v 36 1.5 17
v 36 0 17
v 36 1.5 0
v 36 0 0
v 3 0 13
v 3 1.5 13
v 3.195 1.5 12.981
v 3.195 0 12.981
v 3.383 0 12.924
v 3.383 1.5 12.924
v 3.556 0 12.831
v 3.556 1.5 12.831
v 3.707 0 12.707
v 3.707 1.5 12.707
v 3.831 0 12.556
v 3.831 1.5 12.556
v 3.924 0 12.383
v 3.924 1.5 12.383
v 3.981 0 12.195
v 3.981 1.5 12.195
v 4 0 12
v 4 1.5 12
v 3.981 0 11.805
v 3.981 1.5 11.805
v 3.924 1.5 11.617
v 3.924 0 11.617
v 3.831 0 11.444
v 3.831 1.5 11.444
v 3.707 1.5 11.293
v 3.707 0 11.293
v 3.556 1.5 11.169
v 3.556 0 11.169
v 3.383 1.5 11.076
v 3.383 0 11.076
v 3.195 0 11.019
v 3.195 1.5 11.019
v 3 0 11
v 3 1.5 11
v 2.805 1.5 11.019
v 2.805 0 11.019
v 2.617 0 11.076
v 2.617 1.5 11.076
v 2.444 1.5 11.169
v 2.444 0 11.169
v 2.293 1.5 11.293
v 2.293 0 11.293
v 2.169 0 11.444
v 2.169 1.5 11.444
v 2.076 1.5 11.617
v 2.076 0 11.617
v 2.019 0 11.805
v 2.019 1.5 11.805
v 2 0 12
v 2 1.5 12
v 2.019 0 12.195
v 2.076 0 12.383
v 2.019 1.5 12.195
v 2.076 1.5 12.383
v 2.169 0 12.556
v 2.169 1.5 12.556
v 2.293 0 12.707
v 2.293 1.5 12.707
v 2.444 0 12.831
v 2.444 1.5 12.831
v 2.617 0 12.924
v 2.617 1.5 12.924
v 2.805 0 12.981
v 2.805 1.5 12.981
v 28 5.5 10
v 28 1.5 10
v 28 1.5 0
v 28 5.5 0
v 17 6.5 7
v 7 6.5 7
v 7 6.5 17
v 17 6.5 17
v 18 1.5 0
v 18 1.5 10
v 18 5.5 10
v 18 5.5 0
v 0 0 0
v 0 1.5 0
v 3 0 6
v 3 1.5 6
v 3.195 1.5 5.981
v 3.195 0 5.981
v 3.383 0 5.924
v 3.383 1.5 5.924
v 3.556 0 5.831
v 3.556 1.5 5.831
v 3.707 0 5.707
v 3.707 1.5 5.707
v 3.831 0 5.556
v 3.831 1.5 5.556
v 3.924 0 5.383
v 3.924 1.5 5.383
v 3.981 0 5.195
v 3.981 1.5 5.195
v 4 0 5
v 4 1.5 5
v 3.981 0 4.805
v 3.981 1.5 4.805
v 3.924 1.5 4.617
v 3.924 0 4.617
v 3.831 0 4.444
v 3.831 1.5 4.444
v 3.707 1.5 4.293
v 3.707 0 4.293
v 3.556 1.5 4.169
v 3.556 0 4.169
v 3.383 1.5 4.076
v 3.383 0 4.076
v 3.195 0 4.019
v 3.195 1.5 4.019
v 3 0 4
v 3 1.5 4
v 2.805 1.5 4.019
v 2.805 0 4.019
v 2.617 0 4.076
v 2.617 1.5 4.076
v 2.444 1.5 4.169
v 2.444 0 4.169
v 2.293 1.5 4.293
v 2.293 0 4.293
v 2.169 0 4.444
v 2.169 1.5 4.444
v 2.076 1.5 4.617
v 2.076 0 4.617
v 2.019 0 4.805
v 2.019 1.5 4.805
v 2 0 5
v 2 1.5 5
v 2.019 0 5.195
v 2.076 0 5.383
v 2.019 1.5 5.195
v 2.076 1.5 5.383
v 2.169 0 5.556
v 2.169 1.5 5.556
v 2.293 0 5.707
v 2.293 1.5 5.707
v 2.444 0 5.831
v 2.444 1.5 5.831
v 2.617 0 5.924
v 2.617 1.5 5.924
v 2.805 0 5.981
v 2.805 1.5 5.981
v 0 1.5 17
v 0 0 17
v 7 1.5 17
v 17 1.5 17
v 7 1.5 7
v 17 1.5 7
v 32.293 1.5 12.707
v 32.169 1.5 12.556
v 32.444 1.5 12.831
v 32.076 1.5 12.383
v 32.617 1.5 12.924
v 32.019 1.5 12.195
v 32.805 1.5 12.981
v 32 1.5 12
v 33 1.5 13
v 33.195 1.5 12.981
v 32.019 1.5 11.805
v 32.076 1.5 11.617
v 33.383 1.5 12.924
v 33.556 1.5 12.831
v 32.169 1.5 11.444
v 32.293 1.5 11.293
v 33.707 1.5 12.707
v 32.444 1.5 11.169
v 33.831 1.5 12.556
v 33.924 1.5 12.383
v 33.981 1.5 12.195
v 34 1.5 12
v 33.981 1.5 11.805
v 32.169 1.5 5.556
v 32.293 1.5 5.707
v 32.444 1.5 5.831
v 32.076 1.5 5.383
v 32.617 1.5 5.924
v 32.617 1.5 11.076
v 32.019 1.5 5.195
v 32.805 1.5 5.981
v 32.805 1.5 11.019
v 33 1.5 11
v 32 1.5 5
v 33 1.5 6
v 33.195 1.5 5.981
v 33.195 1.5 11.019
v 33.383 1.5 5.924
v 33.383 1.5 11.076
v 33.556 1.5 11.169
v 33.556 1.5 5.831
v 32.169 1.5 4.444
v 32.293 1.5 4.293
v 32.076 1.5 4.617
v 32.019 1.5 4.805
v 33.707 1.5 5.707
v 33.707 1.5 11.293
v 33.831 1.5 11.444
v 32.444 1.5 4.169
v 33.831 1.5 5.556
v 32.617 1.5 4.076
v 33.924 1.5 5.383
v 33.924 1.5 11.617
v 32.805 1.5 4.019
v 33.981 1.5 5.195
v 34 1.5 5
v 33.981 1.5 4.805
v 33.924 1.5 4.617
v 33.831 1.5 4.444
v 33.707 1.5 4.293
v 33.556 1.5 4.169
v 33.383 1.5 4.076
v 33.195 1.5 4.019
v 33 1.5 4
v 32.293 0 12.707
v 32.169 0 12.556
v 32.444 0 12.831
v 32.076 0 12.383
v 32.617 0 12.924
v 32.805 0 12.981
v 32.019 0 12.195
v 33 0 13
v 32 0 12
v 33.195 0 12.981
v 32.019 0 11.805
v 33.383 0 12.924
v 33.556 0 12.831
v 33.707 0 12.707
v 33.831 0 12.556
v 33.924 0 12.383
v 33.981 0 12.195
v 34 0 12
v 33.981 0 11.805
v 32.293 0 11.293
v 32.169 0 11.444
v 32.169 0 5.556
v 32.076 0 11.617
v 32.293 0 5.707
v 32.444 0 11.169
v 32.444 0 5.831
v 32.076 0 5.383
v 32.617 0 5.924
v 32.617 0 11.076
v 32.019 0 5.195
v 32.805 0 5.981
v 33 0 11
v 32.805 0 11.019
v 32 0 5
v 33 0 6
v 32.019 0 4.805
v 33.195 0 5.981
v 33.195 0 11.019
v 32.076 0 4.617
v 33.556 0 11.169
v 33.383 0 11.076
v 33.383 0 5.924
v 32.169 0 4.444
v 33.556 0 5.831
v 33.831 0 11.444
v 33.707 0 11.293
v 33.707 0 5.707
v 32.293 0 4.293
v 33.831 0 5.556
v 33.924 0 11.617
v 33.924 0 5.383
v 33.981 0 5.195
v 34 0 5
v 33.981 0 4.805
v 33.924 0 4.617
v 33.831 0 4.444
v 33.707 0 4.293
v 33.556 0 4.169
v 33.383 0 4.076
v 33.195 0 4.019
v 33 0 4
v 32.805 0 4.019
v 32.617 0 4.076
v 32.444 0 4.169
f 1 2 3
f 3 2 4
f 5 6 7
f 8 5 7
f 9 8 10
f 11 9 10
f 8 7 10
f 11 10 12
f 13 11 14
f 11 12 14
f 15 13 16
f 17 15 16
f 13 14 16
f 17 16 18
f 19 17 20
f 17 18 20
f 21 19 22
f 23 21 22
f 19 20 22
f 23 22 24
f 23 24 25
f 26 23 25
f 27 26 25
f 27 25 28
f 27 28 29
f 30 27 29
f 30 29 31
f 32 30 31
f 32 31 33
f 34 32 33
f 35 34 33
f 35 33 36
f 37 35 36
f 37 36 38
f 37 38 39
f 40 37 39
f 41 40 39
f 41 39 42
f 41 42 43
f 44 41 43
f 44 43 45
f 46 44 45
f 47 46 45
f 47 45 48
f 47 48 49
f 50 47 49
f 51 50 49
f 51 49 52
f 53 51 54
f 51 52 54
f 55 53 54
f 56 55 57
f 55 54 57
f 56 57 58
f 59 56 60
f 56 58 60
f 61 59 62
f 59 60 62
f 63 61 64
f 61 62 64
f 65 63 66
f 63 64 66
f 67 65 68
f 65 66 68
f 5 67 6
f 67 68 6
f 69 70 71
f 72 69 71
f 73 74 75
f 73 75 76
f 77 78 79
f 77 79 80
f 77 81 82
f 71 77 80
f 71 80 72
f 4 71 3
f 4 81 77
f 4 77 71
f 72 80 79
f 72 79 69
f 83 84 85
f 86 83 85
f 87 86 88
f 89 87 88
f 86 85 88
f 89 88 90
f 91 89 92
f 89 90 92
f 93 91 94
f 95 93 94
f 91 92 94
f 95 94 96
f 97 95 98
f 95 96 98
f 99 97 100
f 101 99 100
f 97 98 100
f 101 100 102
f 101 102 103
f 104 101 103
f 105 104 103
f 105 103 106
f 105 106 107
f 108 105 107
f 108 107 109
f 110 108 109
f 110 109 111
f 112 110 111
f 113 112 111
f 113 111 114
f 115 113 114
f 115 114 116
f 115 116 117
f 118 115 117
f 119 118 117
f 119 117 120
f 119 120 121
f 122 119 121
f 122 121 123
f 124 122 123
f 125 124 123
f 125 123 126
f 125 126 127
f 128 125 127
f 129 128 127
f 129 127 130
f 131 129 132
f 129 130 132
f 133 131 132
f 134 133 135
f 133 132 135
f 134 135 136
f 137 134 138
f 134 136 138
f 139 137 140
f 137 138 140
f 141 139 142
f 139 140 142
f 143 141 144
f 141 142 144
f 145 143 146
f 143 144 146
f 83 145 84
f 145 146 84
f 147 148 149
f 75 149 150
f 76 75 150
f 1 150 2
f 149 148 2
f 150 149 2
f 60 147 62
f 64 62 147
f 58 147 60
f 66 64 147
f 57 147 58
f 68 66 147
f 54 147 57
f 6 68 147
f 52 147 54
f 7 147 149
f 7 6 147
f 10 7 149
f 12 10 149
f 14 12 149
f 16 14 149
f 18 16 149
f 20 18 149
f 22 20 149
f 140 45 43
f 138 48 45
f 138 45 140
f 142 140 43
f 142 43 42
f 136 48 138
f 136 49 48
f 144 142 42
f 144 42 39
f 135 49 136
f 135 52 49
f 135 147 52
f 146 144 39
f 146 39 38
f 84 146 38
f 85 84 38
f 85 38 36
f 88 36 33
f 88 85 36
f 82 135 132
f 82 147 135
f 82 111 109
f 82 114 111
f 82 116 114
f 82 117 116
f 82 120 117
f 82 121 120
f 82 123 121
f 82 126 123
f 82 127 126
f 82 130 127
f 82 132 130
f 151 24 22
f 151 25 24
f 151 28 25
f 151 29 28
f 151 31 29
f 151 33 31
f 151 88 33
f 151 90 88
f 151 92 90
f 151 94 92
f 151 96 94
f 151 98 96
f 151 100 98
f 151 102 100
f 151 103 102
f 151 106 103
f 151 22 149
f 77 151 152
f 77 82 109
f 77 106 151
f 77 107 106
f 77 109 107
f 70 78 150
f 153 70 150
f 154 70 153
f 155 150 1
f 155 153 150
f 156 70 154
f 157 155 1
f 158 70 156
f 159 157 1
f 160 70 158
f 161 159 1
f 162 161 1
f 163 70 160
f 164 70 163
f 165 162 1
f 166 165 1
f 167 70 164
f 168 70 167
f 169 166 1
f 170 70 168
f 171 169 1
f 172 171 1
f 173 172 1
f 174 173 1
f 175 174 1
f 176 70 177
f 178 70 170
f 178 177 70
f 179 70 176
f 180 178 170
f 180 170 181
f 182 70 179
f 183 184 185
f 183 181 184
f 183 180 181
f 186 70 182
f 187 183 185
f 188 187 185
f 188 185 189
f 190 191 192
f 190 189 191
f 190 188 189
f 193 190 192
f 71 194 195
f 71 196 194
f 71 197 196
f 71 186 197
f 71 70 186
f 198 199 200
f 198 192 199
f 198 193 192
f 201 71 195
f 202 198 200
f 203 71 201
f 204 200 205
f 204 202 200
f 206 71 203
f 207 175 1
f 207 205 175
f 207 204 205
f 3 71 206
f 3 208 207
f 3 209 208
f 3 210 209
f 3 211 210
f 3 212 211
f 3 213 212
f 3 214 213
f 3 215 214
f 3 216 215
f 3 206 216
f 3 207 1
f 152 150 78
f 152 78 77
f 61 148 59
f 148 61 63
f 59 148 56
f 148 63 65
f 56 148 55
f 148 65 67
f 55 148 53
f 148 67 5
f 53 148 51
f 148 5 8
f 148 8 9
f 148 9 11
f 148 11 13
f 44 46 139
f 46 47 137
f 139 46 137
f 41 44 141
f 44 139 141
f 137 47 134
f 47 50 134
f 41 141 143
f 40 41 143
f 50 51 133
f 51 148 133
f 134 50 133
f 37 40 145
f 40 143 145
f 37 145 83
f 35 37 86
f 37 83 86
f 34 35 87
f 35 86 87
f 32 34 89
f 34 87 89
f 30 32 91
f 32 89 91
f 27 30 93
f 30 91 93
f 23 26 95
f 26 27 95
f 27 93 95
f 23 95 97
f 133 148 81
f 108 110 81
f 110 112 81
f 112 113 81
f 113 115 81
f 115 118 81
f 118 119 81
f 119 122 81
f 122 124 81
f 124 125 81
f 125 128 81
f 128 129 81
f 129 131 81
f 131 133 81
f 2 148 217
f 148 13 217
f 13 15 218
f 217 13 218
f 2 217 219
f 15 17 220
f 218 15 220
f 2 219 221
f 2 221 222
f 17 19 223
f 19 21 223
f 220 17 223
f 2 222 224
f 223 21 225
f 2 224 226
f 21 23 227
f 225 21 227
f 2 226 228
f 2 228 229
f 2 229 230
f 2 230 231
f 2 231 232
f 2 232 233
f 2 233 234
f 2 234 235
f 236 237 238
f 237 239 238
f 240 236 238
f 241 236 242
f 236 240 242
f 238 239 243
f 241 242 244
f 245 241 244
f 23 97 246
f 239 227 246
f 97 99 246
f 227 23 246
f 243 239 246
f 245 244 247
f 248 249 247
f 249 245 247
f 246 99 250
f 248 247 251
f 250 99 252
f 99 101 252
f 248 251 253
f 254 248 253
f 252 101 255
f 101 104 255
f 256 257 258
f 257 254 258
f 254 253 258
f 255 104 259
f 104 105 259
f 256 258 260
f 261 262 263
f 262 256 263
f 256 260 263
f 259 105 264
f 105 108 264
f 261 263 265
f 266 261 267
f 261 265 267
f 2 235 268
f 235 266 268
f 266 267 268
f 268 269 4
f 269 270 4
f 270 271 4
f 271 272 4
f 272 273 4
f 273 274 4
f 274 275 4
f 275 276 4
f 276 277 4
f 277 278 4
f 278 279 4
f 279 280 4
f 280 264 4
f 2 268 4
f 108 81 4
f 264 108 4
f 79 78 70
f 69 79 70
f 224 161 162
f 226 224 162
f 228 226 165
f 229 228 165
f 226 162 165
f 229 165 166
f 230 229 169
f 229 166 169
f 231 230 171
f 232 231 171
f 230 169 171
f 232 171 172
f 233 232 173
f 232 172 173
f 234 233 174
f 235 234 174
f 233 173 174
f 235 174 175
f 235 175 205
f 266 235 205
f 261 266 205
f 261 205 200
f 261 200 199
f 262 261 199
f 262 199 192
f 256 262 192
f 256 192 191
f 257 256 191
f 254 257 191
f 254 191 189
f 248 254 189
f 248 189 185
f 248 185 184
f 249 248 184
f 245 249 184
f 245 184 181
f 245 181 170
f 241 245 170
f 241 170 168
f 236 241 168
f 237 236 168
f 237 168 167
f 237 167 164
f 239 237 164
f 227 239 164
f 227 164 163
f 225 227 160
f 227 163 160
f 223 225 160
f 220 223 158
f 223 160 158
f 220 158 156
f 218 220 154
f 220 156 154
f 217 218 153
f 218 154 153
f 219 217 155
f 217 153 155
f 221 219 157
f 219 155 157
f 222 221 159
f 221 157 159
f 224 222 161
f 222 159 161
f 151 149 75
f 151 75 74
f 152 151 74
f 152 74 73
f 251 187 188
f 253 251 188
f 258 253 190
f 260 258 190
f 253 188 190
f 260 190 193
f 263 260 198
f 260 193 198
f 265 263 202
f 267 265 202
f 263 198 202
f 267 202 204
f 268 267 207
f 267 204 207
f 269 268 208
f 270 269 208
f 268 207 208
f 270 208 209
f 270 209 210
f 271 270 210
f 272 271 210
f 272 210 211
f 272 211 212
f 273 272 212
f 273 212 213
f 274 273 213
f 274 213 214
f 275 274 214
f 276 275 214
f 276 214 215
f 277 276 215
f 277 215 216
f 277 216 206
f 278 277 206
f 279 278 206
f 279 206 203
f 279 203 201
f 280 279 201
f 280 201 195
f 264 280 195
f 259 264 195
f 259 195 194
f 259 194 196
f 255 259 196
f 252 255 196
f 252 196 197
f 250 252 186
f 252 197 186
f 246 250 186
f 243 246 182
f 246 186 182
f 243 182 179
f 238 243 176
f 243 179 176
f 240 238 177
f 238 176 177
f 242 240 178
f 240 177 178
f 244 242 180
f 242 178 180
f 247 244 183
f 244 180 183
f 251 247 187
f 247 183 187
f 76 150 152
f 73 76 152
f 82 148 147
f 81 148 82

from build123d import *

# Parameters (mm, degrees)
SKETCH1_W                 = 36
SKETCH1_H                 = 17
BOSS_EXTRUDE1_DEPTH       = 1.5
SKETCH2_W                 = 10
SKETCH2_H                 = 10
BOSS_EXTRUDE2_DEPTH       = 4
SKETCH3_W                 = 10
SKETCH3_H                 = 10
BOSS_EXTRUDE3_DEPTH       = 5
SKETCH4_R                 = 1
CUT_EXTRUDE1_DEPTH        = 5
LPATTERN1_COUNT           = 2
LPATTERN1_PITCH           = 7
LPATTERN2_COUNT           = 2
LPATTERN2_PITCH           = 30
LPATTERN2_COPY_1_SKETCH_R = 1
LPATTERN2_COPY_1_DEPTH    = 5


with BuildPart() as part:
    # Sketch1 → Boss-Extrude1 (new body)
    with BuildSketch(Plane(origin=(0, 0, 0), x_dir=(1, 0, 0), z_dir=(0, 1, 0))):
        with Locations((18, -8.5)):
            Rectangle(SKETCH1_W, SKETCH1_H)
    extrude(amount=BOSS_EXTRUDE1_DEPTH)

    # Sketch2 → Boss-Extrude2 (add)
    with BuildSketch(Plane(origin=(0, 1.5, 0), x_dir=(1, 0, 0), z_dir=(0, 1, 0))):
        with Locations((23, -5)):
            Rectangle(SKETCH2_W, SKETCH2_H)
    extrude(amount=BOSS_EXTRUDE2_DEPTH)

    # Sketch3 → Boss-Extrude3 (add)
    with BuildSketch(Plane(origin=(0, 1.5, 0), x_dir=(1, 0, 0), z_dir=(0, 1, 0))):
        with Locations((12, -12)):
            Rectangle(SKETCH3_W, SKETCH3_H)
    extrude(amount=BOSS_EXTRUDE3_DEPTH)

    # Sketch4 → Cut-Extrude1 (cut)
    with BuildSketch(Plane(origin=(0, 1.5, 0), x_dir=(1, 0, 0), z_dir=(0, 1, 0))):
        with Locations(Location((3, -5, 0), (0, 0, 270))):
            Circle(SKETCH4_R)
    cut_extrude1 = extrude(amount=-CUT_EXTRUDE1_DEPTH, mode=Mode.SUBTRACT)

    # LPattern1: Cut-Extrude1 ×2
    with Locations(*[(0, 0, i * LPATTERN1_PITCH) for i in range(1, LPATTERN1_COUNT)]):
        add(cut_extrude1, mode=Mode.SUBTRACT)

    # LPattern2: Cut-Extrude1 ×2
    with Locations(*[(i * LPATTERN2_PITCH, 0, 0) for i in range(1, LPATTERN2_COUNT)]):
        add(cut_extrude1, mode=Mode.SUBTRACT)

    # LPattern2 copy 1 sketch → LPattern2 copy 1 (cut)
    with BuildSketch(Plane(origin=(30, 1.5, 7), x_dir=(1, 0, 0), z_dir=(0, 1, 0))):
        with Locations(Location((3, -5, 0), (0, 0, 270))):
            Circle(LPATTERN2_COPY_1_SKETCH_R)
    extrude(amount=-LPATTERN2_COPY_1_DEPTH, mode=Mode.SUBTRACT)


solid = part.part
